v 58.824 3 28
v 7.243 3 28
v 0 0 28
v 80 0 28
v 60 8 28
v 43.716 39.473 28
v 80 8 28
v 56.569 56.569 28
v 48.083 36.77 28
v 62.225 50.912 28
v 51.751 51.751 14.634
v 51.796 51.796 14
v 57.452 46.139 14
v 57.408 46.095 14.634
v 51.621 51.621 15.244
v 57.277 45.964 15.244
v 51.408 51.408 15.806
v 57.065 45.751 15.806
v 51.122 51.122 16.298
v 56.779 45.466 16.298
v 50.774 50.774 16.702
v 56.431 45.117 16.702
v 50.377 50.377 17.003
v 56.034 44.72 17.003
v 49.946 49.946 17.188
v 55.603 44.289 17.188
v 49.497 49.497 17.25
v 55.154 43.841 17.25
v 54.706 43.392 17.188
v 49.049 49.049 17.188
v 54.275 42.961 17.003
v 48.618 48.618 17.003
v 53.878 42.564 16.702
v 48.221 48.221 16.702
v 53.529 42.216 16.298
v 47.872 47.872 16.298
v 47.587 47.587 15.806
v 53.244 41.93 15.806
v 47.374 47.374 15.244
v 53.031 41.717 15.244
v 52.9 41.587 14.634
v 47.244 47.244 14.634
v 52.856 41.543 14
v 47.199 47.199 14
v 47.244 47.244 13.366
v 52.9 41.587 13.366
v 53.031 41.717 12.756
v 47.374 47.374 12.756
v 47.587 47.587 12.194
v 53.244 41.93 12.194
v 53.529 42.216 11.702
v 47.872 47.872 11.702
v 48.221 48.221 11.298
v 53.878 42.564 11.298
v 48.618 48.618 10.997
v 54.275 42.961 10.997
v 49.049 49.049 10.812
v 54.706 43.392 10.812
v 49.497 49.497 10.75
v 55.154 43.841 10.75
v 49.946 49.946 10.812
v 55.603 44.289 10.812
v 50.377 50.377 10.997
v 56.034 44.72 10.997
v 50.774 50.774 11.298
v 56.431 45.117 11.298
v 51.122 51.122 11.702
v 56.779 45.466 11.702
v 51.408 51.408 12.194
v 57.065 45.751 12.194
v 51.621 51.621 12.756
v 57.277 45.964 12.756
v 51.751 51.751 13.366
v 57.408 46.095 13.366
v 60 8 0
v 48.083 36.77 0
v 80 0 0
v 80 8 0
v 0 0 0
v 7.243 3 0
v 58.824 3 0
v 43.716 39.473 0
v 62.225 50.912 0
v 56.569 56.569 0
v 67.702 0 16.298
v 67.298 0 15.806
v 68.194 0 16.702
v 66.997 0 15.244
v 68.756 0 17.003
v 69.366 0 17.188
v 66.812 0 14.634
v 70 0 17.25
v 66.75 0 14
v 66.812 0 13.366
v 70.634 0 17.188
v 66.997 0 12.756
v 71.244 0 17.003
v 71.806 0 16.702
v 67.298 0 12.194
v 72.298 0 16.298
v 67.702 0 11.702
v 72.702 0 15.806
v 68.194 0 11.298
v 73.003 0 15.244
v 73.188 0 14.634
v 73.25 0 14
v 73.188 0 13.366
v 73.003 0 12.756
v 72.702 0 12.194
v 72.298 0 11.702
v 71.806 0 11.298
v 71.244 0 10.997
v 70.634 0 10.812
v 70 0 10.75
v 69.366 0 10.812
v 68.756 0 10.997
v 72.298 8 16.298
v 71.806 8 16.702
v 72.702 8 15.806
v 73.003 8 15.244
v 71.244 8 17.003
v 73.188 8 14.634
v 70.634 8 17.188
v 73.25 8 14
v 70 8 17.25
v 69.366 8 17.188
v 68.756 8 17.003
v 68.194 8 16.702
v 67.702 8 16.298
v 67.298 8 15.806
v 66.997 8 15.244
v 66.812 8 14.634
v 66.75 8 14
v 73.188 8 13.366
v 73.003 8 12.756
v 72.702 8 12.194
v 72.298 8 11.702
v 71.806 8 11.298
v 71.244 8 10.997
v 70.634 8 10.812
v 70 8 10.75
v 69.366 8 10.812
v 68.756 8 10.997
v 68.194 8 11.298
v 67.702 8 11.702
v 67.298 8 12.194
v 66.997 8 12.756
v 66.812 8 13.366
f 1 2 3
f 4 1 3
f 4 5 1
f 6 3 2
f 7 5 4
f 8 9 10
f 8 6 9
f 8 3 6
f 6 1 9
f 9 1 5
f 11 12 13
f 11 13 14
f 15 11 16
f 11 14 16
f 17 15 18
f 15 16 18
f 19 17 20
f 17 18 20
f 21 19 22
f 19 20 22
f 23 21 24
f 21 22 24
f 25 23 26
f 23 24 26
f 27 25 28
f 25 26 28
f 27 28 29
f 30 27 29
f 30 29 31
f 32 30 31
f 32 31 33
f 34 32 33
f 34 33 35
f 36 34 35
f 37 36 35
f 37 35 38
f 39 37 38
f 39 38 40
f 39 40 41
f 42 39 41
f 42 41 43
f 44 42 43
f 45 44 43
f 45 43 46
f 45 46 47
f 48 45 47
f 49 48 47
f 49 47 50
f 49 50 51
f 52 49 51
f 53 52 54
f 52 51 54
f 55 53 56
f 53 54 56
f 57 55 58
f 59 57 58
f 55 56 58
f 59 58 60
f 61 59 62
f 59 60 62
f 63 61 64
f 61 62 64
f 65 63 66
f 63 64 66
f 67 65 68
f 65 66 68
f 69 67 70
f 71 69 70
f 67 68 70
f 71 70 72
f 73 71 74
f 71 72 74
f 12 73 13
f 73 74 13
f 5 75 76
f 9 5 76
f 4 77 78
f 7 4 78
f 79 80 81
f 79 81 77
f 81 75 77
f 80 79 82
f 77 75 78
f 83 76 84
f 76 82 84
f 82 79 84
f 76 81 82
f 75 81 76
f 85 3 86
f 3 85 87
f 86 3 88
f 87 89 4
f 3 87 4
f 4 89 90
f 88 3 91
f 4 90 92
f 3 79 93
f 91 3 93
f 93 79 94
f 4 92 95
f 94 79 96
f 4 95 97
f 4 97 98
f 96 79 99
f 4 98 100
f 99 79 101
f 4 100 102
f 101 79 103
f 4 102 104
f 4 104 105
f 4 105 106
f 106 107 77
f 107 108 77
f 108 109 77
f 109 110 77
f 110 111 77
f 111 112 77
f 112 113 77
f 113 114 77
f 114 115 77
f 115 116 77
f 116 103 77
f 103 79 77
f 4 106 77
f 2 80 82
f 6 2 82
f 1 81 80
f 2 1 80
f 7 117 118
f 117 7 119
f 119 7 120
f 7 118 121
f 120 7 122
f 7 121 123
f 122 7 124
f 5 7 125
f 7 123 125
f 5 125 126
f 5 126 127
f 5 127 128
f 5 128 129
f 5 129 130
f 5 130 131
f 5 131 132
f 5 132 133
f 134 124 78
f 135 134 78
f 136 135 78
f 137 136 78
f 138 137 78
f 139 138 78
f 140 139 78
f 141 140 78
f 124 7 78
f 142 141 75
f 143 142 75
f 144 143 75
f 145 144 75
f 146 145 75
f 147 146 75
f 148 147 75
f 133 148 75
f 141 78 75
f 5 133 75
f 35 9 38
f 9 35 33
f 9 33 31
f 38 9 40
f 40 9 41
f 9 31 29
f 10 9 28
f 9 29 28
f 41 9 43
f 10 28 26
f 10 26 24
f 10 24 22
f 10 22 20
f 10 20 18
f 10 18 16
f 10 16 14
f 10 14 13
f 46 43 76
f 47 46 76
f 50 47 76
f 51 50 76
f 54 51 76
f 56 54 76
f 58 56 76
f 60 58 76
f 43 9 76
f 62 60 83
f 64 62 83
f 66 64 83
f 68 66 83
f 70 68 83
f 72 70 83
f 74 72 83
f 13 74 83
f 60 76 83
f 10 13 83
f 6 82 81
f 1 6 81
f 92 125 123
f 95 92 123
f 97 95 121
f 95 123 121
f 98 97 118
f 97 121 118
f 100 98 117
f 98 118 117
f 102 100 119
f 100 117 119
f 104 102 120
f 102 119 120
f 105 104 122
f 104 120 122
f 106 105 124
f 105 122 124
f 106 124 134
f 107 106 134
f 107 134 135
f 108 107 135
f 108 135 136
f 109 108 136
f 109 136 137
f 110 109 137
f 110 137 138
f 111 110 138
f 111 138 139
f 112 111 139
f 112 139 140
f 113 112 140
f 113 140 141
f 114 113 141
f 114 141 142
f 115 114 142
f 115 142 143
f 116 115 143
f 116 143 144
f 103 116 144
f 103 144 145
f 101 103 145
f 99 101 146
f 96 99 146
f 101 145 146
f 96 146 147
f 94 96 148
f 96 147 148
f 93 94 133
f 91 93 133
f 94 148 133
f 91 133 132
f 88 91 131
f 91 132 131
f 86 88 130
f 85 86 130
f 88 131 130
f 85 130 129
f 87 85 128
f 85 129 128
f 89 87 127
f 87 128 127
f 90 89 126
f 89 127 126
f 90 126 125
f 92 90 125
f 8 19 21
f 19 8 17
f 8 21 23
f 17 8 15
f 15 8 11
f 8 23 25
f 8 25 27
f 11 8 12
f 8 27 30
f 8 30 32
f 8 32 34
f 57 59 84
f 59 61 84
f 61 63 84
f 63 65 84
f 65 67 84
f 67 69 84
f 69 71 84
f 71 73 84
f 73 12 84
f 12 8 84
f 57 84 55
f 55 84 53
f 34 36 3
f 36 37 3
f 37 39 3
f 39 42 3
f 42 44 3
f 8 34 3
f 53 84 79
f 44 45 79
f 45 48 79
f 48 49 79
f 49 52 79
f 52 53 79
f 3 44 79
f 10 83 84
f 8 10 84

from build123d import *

# Parameters (mm, degrees)
EXTRUDE_1_DEPTH     = 28
SKETCH_3_R          = 3.25
CUT_EXTRUDE_1_DEPTH = 10
SKETCH_4_R          = 3.25
CUT_EXTRUDE_2_DEPTH = 10


with BuildPart() as part:
    # 草图2 → 凸台-拉伸1 (new body)
    with BuildSketch(Plane.XY):
        Polygon((56.568542495, 56.568542495), (0, 0), (80, 0), (80, 8), (60, 8), (48.083261121, 36.769552622), (62.225396744, 50.911688245), align=None)
        Polygon((7.242640687, 3), (43.716092715, 39.473452028), (58.823891211, 3), align=None, mode=Mode.SUBTRACT)
    extrude(amount=EXTRUDE_1_DEPTH)

    # 草图3 → 切除-拉伸1 (cut)
    with BuildSketch(Plane(origin=(0, 8, 0), x_dir=(1, 0, 0), z_dir=(0, 1, 0))):
        with Locations(Location((70, -14, 0), (0, 0, 270))):
            Circle(SKETCH_3_R)
    extrude(amount=-CUT_EXTRUDE_1_DEPTH, mode=Mode.SUBTRACT)

    # 草图4 → 切除-拉伸2 (cut)
    with BuildSketch(Plane(origin=(5.656854249, -5.656854249, 0), x_dir=(0, 0, -1), z_dir=(0.7071067811865439, -0.7071067811865511, 0))):
        with Locations(Location((-14, 70, 0), (0, 0, 90))):
            Circle(SKETCH_4_R)
    extrude(amount=-CUT_EXTRUDE_2_DEPTH, mode=Mode.SUBTRACT)


solid = part.part
